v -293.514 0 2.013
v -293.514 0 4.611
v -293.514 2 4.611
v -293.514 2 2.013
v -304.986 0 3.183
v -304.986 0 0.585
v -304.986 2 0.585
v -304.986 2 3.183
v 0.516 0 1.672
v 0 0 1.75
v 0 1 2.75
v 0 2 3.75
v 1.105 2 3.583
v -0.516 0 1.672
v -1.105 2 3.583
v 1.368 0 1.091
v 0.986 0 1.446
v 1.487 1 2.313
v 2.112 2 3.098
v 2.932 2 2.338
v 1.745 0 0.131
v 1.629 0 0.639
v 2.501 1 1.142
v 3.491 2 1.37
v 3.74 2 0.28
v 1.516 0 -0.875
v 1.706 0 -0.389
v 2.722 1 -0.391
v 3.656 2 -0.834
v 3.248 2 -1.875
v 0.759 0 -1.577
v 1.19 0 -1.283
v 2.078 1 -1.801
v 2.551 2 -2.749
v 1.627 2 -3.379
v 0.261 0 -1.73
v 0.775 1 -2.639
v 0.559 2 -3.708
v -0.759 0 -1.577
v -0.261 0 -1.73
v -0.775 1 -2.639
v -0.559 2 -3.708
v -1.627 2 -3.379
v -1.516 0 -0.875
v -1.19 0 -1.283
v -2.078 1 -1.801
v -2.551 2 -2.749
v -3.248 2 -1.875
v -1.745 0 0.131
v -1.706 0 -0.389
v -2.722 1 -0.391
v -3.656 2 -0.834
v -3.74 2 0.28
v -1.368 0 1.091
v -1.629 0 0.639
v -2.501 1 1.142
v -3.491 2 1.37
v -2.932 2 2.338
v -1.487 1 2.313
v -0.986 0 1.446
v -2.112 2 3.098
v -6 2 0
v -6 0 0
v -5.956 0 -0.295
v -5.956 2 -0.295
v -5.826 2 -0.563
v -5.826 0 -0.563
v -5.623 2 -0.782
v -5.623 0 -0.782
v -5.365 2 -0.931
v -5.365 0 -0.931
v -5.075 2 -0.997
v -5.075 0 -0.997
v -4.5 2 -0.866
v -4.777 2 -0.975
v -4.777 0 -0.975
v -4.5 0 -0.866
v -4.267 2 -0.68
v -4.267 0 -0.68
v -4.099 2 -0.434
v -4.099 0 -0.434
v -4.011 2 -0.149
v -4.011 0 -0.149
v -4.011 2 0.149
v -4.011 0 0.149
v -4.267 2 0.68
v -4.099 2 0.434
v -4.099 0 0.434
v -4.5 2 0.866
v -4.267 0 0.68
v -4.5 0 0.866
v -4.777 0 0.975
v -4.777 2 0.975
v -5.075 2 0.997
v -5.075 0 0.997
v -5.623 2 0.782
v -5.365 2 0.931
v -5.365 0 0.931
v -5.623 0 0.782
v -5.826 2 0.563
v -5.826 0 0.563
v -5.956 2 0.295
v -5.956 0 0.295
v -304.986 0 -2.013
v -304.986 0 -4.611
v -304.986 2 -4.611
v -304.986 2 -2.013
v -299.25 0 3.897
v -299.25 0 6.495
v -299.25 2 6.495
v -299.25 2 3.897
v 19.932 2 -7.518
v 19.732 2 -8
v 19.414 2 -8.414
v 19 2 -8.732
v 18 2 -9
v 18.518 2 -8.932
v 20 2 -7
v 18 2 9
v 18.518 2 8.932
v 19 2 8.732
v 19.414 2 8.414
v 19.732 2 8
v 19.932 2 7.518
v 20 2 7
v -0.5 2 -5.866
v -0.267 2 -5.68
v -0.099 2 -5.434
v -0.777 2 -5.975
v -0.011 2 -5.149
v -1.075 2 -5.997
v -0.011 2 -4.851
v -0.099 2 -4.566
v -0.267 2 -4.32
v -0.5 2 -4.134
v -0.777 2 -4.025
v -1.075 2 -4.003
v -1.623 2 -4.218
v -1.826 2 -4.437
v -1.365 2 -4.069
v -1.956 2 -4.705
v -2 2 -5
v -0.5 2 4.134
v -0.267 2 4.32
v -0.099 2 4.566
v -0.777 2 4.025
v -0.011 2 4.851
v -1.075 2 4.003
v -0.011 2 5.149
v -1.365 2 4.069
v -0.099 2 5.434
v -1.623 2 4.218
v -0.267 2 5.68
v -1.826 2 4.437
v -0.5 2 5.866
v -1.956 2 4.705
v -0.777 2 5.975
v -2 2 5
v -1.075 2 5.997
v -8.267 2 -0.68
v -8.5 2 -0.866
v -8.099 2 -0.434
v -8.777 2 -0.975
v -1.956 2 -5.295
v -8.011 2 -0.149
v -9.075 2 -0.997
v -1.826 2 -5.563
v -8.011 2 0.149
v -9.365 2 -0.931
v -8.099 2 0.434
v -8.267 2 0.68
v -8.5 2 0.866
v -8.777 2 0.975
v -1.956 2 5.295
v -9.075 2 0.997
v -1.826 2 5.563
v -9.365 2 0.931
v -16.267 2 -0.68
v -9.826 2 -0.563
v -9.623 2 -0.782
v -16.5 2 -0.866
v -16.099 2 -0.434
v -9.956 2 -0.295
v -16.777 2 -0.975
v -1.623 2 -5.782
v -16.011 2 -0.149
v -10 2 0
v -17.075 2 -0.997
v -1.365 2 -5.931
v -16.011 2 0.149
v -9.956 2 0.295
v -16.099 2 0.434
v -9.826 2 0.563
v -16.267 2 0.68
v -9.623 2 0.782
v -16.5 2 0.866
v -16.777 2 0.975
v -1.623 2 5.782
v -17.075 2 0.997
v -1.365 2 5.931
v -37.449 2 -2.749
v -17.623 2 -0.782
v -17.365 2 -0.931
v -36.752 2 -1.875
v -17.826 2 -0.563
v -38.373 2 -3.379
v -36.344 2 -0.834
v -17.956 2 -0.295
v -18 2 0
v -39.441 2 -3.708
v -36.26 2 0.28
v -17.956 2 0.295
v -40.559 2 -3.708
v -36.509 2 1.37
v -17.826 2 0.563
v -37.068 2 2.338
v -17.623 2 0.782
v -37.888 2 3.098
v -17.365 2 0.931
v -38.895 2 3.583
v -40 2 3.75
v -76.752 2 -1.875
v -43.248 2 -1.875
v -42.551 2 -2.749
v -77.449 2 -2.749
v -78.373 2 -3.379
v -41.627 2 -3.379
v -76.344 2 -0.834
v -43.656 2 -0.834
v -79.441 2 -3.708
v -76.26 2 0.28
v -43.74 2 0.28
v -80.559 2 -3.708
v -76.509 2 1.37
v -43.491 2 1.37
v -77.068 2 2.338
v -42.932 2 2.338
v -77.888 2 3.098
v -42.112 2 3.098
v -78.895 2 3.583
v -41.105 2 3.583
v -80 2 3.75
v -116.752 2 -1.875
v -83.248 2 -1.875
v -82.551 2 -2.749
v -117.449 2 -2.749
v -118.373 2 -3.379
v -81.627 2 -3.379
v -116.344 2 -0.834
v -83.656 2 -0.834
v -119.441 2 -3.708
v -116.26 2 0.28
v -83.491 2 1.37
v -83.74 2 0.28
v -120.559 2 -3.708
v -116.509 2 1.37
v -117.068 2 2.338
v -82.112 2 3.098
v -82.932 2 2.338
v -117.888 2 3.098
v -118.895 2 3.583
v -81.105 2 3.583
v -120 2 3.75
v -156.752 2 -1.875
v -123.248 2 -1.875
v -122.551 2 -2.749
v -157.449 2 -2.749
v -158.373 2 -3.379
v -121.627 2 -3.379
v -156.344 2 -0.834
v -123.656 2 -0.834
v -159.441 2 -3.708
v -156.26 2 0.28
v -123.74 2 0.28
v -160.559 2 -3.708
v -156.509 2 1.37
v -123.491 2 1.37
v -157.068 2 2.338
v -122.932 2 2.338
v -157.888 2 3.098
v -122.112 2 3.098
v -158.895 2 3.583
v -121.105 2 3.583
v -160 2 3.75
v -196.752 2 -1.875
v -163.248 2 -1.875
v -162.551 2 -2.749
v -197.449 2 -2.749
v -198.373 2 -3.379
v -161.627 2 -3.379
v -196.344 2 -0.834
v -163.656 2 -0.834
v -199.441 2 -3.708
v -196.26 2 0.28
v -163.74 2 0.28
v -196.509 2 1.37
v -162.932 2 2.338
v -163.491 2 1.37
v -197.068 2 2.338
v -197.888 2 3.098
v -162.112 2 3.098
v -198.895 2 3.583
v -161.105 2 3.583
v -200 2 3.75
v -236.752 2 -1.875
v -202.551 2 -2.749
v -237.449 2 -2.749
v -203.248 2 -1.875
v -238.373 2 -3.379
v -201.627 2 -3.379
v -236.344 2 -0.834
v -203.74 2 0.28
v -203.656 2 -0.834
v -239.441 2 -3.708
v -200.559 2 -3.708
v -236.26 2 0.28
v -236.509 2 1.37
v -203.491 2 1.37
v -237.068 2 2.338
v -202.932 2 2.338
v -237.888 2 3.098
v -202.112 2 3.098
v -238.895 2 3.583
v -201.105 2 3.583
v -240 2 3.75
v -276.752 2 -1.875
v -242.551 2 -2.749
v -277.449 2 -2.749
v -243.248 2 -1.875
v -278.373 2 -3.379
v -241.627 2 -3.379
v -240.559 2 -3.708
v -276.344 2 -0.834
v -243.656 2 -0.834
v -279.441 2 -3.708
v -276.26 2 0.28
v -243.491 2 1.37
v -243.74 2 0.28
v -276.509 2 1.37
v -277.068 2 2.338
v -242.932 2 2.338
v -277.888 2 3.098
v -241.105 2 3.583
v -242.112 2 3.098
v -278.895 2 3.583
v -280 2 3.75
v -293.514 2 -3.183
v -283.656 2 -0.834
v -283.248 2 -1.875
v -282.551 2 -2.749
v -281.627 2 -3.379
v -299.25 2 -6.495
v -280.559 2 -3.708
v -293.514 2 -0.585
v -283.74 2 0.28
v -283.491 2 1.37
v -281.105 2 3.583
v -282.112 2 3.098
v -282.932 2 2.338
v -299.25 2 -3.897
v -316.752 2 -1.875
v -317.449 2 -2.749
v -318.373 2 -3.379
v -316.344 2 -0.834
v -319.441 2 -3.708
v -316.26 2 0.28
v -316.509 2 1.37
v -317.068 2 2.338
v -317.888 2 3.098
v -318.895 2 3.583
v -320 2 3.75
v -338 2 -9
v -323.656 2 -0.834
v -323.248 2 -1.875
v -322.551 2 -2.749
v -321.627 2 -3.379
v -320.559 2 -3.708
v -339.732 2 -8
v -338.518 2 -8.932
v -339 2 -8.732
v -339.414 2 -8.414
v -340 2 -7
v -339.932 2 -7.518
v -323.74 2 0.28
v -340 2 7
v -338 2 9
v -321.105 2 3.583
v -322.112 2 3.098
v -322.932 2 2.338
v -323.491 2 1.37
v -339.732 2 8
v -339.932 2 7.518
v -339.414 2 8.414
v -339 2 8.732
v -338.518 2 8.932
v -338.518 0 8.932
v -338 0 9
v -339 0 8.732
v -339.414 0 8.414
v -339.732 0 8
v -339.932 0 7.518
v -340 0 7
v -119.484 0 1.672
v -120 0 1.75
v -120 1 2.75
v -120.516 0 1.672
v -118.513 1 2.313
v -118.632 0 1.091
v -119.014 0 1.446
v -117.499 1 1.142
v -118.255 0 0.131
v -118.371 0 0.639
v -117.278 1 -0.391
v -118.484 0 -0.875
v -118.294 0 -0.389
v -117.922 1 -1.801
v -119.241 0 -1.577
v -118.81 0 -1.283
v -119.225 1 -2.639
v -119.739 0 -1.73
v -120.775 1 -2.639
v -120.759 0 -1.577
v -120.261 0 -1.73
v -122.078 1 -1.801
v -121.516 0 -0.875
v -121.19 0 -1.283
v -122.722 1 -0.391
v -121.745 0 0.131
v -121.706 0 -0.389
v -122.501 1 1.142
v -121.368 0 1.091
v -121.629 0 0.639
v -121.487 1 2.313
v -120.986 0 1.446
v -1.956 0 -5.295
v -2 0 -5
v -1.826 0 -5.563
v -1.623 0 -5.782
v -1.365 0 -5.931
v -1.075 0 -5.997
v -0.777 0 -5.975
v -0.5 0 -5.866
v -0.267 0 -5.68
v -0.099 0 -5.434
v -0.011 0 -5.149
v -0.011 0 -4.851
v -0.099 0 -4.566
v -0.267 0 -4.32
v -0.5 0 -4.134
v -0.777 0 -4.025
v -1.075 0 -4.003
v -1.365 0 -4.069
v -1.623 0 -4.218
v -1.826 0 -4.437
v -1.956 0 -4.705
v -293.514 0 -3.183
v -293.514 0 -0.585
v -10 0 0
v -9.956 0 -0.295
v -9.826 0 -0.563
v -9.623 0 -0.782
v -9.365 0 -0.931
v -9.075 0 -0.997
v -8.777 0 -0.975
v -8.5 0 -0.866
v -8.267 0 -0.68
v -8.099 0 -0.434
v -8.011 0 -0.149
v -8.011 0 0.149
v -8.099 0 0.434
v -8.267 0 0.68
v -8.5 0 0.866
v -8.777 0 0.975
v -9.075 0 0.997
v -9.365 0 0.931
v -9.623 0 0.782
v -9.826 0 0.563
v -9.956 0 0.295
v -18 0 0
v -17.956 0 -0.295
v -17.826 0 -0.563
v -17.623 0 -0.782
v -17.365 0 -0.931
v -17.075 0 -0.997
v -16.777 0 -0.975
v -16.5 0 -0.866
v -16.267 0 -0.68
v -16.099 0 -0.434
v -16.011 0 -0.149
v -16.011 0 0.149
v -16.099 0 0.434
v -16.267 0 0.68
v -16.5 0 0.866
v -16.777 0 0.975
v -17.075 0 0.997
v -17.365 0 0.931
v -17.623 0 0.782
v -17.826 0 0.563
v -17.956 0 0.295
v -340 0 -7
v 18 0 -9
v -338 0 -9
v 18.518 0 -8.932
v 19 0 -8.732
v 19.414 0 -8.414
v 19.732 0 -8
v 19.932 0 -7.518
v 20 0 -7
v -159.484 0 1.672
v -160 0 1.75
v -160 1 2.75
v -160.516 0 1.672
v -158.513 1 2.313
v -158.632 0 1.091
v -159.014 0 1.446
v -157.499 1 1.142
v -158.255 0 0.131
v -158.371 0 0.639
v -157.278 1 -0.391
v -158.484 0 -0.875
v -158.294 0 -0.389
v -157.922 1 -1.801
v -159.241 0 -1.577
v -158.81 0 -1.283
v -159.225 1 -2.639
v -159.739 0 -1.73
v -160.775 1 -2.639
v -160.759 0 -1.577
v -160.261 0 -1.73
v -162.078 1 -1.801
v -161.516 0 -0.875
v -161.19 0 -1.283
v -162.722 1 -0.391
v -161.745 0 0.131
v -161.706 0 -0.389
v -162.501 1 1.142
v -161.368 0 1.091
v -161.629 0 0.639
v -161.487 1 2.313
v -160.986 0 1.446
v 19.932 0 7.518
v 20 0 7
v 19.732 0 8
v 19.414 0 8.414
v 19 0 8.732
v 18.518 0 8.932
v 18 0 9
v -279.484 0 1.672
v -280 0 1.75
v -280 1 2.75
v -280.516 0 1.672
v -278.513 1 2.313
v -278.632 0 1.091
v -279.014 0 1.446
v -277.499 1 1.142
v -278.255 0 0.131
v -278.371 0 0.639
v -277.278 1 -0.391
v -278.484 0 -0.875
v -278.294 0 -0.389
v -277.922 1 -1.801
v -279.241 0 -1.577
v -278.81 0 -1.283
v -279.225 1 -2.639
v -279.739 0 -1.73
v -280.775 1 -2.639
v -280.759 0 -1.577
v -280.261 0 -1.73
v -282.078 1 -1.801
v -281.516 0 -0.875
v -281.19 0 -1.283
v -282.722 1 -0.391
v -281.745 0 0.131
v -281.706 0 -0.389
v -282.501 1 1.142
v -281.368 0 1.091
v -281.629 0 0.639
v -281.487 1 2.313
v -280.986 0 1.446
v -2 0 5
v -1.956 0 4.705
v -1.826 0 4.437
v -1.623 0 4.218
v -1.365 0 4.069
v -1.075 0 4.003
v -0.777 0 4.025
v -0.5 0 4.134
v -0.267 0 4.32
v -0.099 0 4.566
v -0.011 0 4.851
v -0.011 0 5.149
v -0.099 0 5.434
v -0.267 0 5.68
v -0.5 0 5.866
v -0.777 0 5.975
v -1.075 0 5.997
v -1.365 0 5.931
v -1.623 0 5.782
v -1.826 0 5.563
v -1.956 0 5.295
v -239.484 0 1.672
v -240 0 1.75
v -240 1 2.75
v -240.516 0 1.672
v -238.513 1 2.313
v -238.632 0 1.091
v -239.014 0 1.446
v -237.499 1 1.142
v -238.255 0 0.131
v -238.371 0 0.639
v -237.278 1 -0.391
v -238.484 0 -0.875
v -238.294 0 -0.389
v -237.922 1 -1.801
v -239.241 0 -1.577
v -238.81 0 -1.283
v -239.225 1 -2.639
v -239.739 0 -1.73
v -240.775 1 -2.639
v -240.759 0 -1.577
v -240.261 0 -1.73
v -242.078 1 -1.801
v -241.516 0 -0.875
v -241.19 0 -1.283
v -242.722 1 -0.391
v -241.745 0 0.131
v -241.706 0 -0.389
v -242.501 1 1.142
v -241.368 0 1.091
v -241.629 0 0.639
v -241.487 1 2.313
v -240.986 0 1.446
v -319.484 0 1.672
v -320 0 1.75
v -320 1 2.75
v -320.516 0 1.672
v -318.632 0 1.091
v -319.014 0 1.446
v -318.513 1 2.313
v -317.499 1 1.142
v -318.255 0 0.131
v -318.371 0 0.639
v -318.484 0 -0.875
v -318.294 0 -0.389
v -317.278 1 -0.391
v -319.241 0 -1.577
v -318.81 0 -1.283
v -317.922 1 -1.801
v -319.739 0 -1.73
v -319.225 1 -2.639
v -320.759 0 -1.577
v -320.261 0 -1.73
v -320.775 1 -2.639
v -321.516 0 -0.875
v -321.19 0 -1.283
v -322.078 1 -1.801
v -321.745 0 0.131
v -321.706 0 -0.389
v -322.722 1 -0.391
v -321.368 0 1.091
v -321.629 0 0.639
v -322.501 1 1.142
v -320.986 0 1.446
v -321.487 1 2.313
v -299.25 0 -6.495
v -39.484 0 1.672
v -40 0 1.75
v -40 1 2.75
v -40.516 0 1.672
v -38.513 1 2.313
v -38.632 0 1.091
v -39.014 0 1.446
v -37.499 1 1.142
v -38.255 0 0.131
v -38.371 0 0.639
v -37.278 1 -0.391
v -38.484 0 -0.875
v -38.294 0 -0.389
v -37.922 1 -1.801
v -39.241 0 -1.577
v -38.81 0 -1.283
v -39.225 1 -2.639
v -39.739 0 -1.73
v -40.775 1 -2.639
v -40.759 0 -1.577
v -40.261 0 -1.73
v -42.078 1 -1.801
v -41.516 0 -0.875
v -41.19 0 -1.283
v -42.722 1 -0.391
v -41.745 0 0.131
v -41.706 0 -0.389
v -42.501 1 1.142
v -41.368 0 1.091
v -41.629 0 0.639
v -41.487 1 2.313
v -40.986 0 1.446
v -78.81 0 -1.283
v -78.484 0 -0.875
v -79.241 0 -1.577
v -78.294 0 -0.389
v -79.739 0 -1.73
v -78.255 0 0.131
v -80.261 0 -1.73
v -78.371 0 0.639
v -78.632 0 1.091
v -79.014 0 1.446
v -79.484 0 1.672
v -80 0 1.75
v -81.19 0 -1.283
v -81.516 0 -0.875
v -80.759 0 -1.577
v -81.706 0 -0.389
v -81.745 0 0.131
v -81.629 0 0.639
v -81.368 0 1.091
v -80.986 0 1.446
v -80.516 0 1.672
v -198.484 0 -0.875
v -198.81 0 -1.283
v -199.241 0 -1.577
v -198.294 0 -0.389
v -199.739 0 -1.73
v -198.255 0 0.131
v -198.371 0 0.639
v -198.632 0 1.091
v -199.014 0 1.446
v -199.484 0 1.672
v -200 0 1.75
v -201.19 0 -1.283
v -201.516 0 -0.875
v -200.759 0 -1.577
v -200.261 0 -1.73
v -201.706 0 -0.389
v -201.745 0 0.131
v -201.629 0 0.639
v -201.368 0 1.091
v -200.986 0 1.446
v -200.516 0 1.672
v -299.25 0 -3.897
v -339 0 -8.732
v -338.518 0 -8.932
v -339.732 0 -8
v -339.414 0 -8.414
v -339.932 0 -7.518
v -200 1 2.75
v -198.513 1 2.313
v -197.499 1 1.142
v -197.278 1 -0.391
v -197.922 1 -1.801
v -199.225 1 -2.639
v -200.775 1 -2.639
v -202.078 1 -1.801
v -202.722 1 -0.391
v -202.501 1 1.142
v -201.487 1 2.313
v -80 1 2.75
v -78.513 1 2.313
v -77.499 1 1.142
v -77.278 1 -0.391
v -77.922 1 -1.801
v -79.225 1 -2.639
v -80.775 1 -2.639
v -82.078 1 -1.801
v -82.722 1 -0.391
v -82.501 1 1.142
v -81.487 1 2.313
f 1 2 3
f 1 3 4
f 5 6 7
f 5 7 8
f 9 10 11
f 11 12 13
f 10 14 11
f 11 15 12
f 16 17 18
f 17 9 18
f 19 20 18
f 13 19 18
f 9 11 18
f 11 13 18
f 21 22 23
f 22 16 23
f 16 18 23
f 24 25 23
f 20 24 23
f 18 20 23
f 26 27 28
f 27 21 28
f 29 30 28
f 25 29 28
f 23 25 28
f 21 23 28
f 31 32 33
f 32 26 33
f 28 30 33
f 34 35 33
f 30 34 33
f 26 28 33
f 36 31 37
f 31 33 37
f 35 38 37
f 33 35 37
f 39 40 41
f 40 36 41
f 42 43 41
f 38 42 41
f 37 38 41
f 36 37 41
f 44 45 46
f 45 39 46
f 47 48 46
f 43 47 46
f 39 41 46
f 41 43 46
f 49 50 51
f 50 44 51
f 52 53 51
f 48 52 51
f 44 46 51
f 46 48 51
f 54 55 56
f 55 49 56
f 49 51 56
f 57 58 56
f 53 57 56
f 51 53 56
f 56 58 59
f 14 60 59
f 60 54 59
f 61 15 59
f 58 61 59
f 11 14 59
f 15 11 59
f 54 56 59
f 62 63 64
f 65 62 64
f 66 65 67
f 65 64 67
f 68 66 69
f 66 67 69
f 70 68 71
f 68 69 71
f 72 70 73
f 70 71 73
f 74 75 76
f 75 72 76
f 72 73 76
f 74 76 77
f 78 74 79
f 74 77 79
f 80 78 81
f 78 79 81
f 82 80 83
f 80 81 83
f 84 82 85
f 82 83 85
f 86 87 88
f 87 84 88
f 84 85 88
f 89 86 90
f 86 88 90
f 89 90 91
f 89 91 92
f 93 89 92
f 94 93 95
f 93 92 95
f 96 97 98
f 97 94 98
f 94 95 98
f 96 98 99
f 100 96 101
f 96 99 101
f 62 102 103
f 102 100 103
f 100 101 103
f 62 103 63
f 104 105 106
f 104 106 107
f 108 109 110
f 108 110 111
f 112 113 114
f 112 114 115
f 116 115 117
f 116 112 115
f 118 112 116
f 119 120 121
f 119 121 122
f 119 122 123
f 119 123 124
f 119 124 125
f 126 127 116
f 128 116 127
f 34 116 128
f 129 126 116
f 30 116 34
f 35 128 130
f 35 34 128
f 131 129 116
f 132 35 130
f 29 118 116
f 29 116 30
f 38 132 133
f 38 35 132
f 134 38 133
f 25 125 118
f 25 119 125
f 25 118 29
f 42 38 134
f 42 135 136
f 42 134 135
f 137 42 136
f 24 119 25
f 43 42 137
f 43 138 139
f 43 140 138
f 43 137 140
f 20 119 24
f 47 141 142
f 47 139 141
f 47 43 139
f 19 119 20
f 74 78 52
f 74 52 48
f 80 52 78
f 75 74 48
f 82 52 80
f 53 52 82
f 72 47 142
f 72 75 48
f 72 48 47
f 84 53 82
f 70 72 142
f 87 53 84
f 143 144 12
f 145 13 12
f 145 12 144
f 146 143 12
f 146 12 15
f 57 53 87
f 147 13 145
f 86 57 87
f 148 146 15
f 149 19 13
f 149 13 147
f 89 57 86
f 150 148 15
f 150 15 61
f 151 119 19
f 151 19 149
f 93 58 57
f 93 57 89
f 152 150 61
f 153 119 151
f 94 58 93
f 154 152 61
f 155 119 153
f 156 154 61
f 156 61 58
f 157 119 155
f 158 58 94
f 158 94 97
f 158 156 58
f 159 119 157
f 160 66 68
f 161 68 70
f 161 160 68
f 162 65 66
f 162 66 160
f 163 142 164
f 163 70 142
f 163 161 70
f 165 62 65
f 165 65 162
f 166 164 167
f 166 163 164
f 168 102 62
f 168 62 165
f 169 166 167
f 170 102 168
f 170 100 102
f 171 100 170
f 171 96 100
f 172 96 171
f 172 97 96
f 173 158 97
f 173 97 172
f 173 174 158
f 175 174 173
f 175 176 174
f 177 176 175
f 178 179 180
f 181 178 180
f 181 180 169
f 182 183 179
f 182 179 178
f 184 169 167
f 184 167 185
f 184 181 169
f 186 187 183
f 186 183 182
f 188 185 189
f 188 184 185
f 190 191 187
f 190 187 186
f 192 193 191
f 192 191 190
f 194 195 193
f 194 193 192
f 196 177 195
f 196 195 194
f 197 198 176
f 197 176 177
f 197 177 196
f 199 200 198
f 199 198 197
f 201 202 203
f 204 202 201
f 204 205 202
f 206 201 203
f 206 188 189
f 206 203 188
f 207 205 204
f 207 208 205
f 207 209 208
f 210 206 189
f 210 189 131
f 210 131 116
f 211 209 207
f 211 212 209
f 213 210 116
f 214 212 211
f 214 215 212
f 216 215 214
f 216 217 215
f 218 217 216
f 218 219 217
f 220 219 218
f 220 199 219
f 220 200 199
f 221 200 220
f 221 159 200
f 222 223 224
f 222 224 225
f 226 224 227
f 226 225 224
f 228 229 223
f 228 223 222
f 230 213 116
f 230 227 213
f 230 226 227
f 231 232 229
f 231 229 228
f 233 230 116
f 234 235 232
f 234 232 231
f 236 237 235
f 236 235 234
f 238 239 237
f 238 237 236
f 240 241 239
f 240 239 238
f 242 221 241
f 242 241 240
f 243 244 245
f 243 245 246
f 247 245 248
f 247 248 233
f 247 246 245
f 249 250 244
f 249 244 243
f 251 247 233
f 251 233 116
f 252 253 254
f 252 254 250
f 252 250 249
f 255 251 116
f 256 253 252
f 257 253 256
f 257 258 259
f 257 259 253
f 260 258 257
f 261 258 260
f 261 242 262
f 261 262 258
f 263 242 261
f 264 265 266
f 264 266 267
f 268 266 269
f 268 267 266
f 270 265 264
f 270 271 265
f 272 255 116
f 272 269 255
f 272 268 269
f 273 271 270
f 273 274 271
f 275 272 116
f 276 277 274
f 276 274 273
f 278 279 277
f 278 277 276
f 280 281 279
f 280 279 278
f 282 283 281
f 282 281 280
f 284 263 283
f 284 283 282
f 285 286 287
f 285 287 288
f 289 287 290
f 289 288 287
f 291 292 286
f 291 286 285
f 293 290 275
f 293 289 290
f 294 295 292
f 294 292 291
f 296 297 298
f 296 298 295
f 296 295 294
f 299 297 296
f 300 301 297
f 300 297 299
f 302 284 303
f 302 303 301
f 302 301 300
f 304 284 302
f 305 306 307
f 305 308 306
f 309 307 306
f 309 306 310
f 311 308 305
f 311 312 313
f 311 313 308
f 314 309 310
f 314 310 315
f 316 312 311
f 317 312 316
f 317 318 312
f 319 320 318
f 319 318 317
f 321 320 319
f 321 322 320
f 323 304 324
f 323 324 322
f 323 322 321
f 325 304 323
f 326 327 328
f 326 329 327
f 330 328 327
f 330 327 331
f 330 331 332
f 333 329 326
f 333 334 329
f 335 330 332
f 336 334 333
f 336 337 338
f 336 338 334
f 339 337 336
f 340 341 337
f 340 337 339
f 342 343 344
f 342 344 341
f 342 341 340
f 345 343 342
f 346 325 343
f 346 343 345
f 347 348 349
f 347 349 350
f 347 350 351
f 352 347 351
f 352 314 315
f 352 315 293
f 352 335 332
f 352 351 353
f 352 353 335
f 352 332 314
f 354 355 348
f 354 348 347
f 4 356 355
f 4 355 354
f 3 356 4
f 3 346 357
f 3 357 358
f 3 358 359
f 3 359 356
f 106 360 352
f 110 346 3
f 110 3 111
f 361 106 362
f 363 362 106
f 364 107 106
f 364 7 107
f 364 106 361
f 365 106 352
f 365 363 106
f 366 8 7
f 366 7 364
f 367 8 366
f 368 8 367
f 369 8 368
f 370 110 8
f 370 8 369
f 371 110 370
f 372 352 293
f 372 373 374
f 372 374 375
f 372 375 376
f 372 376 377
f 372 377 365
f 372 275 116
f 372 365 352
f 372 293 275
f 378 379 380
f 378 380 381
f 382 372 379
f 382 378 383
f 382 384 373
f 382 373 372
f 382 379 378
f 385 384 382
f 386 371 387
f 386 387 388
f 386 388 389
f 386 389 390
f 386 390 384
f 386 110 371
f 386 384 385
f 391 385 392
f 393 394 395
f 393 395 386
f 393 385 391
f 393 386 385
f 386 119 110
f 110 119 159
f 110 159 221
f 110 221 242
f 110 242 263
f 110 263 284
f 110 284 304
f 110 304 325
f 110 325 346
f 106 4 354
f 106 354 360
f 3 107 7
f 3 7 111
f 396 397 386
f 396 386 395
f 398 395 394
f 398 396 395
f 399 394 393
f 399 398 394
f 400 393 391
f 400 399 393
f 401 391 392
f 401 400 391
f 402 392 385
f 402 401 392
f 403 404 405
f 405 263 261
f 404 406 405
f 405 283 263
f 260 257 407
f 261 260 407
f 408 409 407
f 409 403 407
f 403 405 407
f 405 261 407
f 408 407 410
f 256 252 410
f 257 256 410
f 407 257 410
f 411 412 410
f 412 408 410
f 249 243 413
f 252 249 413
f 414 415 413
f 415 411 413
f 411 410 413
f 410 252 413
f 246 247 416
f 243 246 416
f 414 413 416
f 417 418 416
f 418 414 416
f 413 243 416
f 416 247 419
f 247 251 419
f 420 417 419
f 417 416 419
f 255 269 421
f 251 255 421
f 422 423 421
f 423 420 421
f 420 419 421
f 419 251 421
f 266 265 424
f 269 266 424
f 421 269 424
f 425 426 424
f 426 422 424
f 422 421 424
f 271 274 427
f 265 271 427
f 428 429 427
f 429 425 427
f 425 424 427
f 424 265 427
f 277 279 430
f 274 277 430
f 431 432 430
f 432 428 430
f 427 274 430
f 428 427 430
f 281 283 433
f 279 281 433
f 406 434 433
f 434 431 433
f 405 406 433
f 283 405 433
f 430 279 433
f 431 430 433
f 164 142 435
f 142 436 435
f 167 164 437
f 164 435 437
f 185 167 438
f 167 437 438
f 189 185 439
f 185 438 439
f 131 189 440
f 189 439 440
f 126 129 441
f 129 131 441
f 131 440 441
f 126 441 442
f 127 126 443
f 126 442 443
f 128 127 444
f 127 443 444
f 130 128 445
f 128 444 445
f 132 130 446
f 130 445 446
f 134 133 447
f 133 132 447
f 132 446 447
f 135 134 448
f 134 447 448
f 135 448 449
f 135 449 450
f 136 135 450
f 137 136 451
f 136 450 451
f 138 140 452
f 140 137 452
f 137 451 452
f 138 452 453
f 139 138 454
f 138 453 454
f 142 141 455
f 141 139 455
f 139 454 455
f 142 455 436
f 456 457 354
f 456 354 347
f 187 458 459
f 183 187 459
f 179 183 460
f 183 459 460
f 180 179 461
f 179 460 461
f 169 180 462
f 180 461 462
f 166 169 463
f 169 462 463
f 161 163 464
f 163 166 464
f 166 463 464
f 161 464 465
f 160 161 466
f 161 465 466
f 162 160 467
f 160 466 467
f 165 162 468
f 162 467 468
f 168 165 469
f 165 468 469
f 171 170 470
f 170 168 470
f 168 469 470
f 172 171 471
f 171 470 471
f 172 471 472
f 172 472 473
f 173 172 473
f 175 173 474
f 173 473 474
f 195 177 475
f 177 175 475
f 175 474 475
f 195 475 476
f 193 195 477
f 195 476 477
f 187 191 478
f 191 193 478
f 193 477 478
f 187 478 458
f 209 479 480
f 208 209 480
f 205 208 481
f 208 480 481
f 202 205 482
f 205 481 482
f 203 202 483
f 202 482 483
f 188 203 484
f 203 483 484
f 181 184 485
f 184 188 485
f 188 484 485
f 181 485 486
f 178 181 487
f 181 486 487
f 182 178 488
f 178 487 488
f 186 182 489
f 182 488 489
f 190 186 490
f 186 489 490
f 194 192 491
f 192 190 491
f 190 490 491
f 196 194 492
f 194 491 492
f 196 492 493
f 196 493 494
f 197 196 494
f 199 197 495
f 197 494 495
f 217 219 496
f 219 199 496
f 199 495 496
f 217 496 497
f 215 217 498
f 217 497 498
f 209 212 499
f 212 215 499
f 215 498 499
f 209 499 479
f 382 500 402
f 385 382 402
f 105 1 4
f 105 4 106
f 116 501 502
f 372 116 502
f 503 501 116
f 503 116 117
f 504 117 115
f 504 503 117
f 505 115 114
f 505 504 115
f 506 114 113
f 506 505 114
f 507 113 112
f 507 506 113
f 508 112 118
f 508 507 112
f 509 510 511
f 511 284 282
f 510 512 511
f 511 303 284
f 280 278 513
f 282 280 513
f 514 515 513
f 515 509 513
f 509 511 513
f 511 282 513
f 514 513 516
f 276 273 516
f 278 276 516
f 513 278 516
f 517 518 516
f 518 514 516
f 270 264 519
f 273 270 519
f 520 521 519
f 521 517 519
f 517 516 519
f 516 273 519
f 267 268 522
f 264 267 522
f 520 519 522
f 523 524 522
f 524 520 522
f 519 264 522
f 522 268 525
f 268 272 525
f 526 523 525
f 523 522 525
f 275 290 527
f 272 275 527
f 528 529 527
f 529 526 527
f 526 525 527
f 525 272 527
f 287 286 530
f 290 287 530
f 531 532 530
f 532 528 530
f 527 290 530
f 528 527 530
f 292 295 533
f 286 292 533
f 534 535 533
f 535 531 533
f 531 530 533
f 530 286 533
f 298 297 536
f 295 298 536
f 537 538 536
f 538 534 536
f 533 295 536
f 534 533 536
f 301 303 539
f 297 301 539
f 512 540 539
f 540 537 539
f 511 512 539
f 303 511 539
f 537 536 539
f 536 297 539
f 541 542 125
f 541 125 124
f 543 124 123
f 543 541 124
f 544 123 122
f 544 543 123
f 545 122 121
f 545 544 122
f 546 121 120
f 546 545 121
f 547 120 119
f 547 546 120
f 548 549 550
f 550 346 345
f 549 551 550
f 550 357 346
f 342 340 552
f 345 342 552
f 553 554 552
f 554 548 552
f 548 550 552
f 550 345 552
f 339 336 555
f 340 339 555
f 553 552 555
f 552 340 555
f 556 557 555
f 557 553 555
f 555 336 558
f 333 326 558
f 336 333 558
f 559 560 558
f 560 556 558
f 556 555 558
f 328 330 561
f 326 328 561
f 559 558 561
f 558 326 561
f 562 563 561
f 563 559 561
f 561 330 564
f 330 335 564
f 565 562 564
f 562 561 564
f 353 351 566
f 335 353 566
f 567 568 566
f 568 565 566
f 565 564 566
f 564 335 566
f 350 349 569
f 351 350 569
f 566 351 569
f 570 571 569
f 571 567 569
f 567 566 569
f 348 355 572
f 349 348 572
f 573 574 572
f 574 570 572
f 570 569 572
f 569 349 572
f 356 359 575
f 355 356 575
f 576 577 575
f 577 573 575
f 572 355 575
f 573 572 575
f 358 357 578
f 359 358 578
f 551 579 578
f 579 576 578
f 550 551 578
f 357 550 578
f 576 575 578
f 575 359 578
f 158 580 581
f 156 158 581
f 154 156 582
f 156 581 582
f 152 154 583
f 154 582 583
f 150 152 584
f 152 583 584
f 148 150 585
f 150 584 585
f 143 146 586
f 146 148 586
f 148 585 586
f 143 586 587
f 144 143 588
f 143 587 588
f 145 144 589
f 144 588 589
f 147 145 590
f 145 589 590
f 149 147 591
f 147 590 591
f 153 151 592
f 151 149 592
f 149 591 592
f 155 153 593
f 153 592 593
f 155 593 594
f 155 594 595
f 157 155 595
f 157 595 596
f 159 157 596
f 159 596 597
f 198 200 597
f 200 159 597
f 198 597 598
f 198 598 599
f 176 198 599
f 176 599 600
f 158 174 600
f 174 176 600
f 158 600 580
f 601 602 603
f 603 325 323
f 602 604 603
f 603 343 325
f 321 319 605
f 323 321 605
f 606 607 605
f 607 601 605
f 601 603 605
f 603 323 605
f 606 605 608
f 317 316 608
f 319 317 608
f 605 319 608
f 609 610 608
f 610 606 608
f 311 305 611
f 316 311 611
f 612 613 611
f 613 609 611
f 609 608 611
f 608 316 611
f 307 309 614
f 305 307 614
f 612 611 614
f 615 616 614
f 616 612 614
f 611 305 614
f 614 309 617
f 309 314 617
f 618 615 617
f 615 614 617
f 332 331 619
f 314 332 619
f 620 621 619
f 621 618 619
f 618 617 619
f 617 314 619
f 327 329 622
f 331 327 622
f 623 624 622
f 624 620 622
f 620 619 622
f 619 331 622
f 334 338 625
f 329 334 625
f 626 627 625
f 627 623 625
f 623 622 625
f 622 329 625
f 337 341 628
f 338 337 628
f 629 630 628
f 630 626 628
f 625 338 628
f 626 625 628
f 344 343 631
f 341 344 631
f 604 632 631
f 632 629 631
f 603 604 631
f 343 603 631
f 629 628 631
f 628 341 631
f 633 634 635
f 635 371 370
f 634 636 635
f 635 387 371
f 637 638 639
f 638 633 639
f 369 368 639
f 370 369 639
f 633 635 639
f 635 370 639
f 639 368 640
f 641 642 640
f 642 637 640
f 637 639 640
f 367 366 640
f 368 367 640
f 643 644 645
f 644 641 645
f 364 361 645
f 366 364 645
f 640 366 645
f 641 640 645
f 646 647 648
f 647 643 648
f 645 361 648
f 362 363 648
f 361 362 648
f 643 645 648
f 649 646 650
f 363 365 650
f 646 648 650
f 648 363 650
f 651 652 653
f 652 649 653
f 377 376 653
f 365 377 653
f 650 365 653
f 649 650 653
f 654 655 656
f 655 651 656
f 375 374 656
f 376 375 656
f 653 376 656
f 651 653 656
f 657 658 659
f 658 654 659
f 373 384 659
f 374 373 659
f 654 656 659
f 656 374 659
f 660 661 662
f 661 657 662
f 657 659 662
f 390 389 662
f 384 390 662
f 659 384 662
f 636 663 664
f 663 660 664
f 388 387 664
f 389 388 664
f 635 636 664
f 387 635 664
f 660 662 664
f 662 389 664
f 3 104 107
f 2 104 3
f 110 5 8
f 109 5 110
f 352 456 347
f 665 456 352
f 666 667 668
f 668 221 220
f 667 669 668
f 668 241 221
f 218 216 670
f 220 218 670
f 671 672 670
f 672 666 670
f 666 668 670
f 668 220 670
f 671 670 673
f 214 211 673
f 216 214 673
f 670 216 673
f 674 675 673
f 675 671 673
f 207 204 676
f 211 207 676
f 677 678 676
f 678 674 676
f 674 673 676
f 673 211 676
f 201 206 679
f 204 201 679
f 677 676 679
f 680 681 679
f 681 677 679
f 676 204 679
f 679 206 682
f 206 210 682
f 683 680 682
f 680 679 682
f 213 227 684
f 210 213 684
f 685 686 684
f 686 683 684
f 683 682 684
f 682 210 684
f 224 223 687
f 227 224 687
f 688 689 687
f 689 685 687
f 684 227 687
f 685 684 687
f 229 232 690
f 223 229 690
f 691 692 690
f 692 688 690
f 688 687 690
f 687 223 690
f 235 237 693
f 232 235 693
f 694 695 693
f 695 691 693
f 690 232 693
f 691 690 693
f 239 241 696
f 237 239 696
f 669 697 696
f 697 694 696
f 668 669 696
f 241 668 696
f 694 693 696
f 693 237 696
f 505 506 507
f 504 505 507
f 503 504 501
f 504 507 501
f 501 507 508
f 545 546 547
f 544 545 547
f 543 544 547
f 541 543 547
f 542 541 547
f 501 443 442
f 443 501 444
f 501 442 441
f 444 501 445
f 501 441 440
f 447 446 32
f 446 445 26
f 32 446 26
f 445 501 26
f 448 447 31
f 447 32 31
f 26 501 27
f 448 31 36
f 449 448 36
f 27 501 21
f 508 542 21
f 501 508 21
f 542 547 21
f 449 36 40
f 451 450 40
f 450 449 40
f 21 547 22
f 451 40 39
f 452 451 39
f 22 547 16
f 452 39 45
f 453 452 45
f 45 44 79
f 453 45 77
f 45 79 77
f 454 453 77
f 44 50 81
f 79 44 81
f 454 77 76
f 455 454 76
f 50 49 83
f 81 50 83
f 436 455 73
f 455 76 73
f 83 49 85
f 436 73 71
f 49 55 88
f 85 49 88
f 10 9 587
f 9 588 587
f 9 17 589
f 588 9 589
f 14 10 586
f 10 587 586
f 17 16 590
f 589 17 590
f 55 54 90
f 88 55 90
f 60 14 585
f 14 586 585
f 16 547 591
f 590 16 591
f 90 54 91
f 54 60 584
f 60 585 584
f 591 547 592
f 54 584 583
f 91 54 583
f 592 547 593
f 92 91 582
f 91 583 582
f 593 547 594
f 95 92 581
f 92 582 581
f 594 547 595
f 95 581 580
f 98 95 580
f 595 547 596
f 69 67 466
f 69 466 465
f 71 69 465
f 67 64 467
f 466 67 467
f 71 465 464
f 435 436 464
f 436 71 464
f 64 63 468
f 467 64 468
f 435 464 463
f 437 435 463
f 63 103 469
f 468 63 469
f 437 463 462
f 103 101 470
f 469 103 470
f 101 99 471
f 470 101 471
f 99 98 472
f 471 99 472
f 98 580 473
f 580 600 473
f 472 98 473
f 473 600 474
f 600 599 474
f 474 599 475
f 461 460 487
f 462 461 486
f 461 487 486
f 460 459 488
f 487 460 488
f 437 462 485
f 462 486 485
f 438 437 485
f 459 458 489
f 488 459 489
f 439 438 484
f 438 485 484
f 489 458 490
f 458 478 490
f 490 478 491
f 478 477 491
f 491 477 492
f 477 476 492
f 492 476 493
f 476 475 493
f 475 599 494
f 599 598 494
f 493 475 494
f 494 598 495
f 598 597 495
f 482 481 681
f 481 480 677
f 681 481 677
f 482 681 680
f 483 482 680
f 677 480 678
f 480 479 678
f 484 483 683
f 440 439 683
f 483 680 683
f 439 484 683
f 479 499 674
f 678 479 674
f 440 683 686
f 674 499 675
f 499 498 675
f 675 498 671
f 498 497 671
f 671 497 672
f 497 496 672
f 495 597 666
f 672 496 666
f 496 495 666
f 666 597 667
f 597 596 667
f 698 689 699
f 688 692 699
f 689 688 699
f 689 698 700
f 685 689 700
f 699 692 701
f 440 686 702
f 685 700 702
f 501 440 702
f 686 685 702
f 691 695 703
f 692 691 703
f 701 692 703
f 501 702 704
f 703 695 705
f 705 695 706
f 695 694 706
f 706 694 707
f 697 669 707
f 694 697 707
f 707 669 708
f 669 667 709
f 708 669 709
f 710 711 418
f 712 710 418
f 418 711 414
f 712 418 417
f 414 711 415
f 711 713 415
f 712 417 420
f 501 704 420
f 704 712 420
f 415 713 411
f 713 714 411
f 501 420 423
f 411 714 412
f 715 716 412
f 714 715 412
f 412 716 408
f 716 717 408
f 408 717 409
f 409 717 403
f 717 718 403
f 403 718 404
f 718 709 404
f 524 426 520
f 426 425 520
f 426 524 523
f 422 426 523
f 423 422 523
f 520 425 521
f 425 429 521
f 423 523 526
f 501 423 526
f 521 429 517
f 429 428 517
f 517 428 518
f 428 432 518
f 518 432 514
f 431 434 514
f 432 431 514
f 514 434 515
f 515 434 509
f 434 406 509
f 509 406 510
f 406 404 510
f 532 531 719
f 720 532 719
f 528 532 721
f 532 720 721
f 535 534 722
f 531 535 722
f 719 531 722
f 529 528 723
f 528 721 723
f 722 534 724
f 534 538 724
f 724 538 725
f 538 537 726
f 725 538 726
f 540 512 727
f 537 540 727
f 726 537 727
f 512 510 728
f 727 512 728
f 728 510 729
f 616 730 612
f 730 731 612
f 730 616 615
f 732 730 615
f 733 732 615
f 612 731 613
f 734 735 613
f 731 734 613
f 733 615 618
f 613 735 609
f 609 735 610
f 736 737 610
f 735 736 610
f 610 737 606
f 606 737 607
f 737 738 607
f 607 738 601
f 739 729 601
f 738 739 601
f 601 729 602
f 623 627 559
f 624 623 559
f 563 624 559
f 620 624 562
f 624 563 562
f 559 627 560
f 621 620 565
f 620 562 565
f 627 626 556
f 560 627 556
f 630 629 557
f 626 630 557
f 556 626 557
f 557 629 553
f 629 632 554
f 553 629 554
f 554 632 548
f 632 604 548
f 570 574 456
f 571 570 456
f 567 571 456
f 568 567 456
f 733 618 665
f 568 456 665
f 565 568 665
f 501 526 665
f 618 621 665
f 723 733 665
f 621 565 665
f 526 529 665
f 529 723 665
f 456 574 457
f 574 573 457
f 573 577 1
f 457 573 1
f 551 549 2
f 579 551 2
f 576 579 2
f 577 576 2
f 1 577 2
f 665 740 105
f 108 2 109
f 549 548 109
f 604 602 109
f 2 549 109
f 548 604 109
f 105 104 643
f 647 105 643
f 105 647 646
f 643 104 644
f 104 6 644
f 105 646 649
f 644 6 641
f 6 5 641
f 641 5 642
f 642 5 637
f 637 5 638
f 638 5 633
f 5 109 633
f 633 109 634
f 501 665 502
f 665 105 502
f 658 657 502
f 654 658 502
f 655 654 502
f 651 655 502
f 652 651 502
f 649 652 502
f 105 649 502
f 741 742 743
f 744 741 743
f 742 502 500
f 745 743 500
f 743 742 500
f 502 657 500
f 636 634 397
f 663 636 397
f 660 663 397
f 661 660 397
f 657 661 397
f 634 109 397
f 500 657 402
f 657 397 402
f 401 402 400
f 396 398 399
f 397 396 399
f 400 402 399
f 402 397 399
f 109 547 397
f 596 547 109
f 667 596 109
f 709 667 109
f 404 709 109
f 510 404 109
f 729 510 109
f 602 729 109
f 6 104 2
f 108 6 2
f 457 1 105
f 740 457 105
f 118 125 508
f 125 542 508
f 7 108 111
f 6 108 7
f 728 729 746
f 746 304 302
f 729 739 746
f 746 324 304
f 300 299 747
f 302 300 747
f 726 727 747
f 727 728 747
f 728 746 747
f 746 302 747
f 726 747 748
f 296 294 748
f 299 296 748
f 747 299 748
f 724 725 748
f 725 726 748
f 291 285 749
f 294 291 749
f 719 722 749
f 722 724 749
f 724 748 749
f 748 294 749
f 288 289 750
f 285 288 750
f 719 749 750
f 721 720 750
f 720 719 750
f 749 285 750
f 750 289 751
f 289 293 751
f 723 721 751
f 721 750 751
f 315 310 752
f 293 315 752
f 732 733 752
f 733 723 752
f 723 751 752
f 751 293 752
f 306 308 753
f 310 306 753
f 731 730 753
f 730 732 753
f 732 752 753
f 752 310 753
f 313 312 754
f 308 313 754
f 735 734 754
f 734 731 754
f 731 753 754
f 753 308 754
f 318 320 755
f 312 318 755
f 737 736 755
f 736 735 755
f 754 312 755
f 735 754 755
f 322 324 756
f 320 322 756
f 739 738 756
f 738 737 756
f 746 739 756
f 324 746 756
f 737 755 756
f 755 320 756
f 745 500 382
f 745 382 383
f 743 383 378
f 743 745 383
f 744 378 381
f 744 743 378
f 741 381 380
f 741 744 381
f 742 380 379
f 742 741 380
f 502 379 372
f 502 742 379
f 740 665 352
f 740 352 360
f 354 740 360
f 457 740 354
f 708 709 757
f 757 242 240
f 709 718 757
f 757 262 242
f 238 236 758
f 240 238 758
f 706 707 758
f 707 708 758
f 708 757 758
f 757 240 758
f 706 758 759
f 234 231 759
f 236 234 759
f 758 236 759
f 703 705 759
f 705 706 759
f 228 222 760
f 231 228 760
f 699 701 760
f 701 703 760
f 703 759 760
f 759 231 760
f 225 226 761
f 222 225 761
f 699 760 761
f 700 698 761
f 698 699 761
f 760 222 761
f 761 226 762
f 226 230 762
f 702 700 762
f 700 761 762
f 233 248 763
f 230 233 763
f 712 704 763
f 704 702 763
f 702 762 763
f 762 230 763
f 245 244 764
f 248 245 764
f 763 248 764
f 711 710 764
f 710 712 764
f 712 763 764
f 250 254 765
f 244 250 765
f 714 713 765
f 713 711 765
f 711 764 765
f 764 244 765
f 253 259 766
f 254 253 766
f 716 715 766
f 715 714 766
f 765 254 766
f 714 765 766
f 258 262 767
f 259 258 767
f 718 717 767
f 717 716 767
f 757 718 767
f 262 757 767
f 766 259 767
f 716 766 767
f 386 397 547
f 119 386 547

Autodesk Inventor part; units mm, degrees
ref_plane "YZ Plane" through (0, 0, 0) normal (1, 0, 0) x (0, 1, 0)
ref_plane "XZ Plane" through (0, 0, 0) normal (0, 1, 0) x (-1, 0, 0)
ref_plane "XY Plane" through (0, 0, 0) normal (0, 0, 1) x (1, 0, 0)
sketch "ExtrusionBacker_X_350mm" plane through (0, 0, 0) normal (0, 0, 1) x (1, 0, 0)
  arc A0 (340.9999, 24.106) -> (342.9999, 26.106) centre (340.9999, 26.106) ccw
  line L0 (342.9999, 26.106) -> (342.9999, 40.106)
  arc A1 (342.9999, 40.106) -> (340.9999, 42.106) centre (340.9999, 40.106) ccw
  line L1 (340.9999, 42.106) -> (-15.0001, 42.106)
  arc A2 (-15.0001, 42.106) -> (-17.0001, 40.106) centre (-15.0001, 40.106) ccw
  line L2 (-17.0001, 40.106) -> (-17.0001, 26.106)
  arc A3 (-17.0001, 26.106) -> (-15.0001, 24.106) centre (-15.0001, 26.106) ccw
  line L3 (-15.0001, 24.106) -> (340.9999, 24.106)
  line L4 (302.2499, 37.0031) -> (307.986, 33.6914)
  line L5 (307.986, 33.6914) -> (307.986, 36.2894)
  line L6 (307.986, 36.2894) -> (302.2499, 39.6012)
  line L7 (302.2499, 39.6012) -> (302.2499, 37.0031)
  line L8 (296.5137, 37.7168) -> (296.5137, 35.1187)
  line L9 (296.5137, 35.1187) -> (307.986, 28.4952)
  line L10 (307.986, 28.4952) -> (307.986, 31.0933)
  line L11 (307.986, 31.0933) -> (296.5137, 37.7168)
  line L12 (296.5137, 32.5207) -> (296.5137, 29.9226)
  line L13 (296.5137, 29.9226) -> (302.2499, 26.6108)
  line L14 (302.2499, 26.6108) -> (302.2499, 29.2089)
  line L15 (302.2499, 29.2089) -> (296.5137, 32.5207)
  circle A4 centre (122.9999, 33.106) radius 1.7
  circle A5 centre (202.9999, 33.106) radius 1.7
  circle A6 centre (242.9999, 33.106) radius 1.7
  circle A7 centre (162.9999, 33.106) radius 1.7
  circle A8 centre (3.9999, 38.106) radius 1
  circle A9 centre (3.9999, 28.106) radius 1
  circle A10 centre (11.9999, 33.106) radius 1
  circle A11 centre (42.9999, 33.106) radius 1.7
  circle A12 centre (82.9999, 33.106) radius 1.7
  circle A13 centre (282.9999, 33.106) radius 1.7
  circle A14 centre (19.9999, 33.106) radius 1
  circle A15 centre (2.9999, 33.106) radius 1.7
  circle A16 centre (322.9999, 33.106) radius 1.7
  circle A17 centre (7.9999, 33.106) radius 1
sketch "Skizze1" plane through (0, 0, 0) normal (0, 1, 0) x (-1, 0, 0)
  arc A0 (338, -9) -> (340, -7) centre (338, -7) ccw
  line L0 (340, -7) -> (340, 7)
  arc A1 (340, 7) -> (338, 9) centre (338, 7) ccw
  line L1 (338, 9) -> (-18, 9)
  arc A2 (-18, 9) -> (-20, 7) centre (-18, 7) ccw
  line L2 (-20, 7) -> (-20, -7)
  arc A3 (-20, -7) -> (-18, -9) centre (-18, -7) ccw
  line L3 (-18, -9) -> (338, -9)
  line L4 (299.25, 3.8971) -> (304.9862, 0.5853)
  line L5 (304.9862, 0.5853) -> (304.9862, 3.1834)
  line L6 (304.9862, 3.1834) -> (299.25, 6.4952)
  line L7 (299.25, 6.4952) -> (299.25, 3.8971)
  line L8 (293.5138, 4.6108) -> (293.5138, 2.0127)
  line L9 (293.5138, 2.0127) -> (304.9862, -4.6108)
  line L10 (304.9862, -4.6108) -> (304.9862, -2.0127)
  line L11 (304.9862, -2.0127) -> (293.5138, 4.6108)
  line L12 (293.5138, -0.5853) -> (293.5138, -3.1834)
  line L13 (293.5138, -3.1834) -> (299.25, -6.4952)
  line L14 (299.25, -6.4952) -> (299.25, -3.8971)
  line L15 (299.25, -3.8971) -> (293.5138, -0.5853)
  circle A4 centre (120, 0) radius 1.7
  circle A5 centre (200, 0) radius 1.7
  circle A6 centre (240, 0) radius 1.7
  circle A7 centre (160, 0) radius 1.7
  circle A8 centre (1, 5) radius 1
  circle A9 centre (1, -5) radius 1
  circle A10 centre (9, 0) radius 1
  circle A11 centre (40, 0) radius 1.7
  circle A12 centre (80, 0) radius 1.7
  circle A13 centre (280, 0) radius 1.7
  circle A14 centre (17, 0) radius 1
  circle A15 centre (0, 0) radius 1.7
  circle A16 centre (320, 0) radius 1.7
  circle A17 centre (5, 0) radius 1
  point P0 (338, -9)
  point P1 (340, 7)
  point P2 (338, 9)
  point P3 (-18, 9)
  point P4 (-20, 7)
  point P5 (-20, -7)
  point P6 (-18, -9)
  point P7 (293.5138, -0.5853)
  point P8 (299.25, -3.8971)
  point P9 (299.25, -6.4952)
  point P10 (293.5138, -3.1834)
  point P11 (293.5138, 4.6108)
  point P12 (304.9862, -2.0127)
  point P13 (304.9862, -4.6108)
  point P14 (293.5138, 2.0127)
  point P15 (299.25, 3.8971)
  point P16 (299.25, 6.4952)
  point P17 (304.9862, 3.1834)
  point P18 (304.9862, 0.5853)
extrude "Extrusion1" add sketch "Skizze1" along normal blind 2
sketch "Skizze2" plane through (0, 2, 0) normal (0, 1, 0) x (1, 0, 0)
  circle A0 centre (-320, 0) radius 1.7 projected
  circle A1 centre (-280, 0) radius 1.7 projected
  circle A2 centre (-240, 0) radius 1.7 projected
  circle A3 centre (-200, 0) radius 1.7 projected
  circle A4 centre (-160, 0) radius 1.7 projected
  circle A5 centre (-120, 0) radius 1.7 projected
  circle A6 centre (-80, 0) radius 1.7 projected
  circle A7 centre (-40, 0) radius 1.7 projected
  circle A8 centre (0, 0) radius 1.7 projected
  point P0 (-81.3289, 1.9857)
hole "Bohrung1" at (-320, 2, 0) at (-280, 2, 0) at (-240, 2, 0) at (-200, 2, 0) at (-160, 2, 0) at (-120, 2, 0) at (-80, 2, 0) at (-40, 2, 0) at (0, 2, 0) direction (0, -1, 0) diameter 3.4 end through all countersink diameter 7.5 countersink angle 90 clearance for "Innensechskant-Senkkopfschraube DIN EN ISO 10642" size "M3" standard "DIN"
properties part number "X Extrusion-Backer (350mm)" material "Titan"
